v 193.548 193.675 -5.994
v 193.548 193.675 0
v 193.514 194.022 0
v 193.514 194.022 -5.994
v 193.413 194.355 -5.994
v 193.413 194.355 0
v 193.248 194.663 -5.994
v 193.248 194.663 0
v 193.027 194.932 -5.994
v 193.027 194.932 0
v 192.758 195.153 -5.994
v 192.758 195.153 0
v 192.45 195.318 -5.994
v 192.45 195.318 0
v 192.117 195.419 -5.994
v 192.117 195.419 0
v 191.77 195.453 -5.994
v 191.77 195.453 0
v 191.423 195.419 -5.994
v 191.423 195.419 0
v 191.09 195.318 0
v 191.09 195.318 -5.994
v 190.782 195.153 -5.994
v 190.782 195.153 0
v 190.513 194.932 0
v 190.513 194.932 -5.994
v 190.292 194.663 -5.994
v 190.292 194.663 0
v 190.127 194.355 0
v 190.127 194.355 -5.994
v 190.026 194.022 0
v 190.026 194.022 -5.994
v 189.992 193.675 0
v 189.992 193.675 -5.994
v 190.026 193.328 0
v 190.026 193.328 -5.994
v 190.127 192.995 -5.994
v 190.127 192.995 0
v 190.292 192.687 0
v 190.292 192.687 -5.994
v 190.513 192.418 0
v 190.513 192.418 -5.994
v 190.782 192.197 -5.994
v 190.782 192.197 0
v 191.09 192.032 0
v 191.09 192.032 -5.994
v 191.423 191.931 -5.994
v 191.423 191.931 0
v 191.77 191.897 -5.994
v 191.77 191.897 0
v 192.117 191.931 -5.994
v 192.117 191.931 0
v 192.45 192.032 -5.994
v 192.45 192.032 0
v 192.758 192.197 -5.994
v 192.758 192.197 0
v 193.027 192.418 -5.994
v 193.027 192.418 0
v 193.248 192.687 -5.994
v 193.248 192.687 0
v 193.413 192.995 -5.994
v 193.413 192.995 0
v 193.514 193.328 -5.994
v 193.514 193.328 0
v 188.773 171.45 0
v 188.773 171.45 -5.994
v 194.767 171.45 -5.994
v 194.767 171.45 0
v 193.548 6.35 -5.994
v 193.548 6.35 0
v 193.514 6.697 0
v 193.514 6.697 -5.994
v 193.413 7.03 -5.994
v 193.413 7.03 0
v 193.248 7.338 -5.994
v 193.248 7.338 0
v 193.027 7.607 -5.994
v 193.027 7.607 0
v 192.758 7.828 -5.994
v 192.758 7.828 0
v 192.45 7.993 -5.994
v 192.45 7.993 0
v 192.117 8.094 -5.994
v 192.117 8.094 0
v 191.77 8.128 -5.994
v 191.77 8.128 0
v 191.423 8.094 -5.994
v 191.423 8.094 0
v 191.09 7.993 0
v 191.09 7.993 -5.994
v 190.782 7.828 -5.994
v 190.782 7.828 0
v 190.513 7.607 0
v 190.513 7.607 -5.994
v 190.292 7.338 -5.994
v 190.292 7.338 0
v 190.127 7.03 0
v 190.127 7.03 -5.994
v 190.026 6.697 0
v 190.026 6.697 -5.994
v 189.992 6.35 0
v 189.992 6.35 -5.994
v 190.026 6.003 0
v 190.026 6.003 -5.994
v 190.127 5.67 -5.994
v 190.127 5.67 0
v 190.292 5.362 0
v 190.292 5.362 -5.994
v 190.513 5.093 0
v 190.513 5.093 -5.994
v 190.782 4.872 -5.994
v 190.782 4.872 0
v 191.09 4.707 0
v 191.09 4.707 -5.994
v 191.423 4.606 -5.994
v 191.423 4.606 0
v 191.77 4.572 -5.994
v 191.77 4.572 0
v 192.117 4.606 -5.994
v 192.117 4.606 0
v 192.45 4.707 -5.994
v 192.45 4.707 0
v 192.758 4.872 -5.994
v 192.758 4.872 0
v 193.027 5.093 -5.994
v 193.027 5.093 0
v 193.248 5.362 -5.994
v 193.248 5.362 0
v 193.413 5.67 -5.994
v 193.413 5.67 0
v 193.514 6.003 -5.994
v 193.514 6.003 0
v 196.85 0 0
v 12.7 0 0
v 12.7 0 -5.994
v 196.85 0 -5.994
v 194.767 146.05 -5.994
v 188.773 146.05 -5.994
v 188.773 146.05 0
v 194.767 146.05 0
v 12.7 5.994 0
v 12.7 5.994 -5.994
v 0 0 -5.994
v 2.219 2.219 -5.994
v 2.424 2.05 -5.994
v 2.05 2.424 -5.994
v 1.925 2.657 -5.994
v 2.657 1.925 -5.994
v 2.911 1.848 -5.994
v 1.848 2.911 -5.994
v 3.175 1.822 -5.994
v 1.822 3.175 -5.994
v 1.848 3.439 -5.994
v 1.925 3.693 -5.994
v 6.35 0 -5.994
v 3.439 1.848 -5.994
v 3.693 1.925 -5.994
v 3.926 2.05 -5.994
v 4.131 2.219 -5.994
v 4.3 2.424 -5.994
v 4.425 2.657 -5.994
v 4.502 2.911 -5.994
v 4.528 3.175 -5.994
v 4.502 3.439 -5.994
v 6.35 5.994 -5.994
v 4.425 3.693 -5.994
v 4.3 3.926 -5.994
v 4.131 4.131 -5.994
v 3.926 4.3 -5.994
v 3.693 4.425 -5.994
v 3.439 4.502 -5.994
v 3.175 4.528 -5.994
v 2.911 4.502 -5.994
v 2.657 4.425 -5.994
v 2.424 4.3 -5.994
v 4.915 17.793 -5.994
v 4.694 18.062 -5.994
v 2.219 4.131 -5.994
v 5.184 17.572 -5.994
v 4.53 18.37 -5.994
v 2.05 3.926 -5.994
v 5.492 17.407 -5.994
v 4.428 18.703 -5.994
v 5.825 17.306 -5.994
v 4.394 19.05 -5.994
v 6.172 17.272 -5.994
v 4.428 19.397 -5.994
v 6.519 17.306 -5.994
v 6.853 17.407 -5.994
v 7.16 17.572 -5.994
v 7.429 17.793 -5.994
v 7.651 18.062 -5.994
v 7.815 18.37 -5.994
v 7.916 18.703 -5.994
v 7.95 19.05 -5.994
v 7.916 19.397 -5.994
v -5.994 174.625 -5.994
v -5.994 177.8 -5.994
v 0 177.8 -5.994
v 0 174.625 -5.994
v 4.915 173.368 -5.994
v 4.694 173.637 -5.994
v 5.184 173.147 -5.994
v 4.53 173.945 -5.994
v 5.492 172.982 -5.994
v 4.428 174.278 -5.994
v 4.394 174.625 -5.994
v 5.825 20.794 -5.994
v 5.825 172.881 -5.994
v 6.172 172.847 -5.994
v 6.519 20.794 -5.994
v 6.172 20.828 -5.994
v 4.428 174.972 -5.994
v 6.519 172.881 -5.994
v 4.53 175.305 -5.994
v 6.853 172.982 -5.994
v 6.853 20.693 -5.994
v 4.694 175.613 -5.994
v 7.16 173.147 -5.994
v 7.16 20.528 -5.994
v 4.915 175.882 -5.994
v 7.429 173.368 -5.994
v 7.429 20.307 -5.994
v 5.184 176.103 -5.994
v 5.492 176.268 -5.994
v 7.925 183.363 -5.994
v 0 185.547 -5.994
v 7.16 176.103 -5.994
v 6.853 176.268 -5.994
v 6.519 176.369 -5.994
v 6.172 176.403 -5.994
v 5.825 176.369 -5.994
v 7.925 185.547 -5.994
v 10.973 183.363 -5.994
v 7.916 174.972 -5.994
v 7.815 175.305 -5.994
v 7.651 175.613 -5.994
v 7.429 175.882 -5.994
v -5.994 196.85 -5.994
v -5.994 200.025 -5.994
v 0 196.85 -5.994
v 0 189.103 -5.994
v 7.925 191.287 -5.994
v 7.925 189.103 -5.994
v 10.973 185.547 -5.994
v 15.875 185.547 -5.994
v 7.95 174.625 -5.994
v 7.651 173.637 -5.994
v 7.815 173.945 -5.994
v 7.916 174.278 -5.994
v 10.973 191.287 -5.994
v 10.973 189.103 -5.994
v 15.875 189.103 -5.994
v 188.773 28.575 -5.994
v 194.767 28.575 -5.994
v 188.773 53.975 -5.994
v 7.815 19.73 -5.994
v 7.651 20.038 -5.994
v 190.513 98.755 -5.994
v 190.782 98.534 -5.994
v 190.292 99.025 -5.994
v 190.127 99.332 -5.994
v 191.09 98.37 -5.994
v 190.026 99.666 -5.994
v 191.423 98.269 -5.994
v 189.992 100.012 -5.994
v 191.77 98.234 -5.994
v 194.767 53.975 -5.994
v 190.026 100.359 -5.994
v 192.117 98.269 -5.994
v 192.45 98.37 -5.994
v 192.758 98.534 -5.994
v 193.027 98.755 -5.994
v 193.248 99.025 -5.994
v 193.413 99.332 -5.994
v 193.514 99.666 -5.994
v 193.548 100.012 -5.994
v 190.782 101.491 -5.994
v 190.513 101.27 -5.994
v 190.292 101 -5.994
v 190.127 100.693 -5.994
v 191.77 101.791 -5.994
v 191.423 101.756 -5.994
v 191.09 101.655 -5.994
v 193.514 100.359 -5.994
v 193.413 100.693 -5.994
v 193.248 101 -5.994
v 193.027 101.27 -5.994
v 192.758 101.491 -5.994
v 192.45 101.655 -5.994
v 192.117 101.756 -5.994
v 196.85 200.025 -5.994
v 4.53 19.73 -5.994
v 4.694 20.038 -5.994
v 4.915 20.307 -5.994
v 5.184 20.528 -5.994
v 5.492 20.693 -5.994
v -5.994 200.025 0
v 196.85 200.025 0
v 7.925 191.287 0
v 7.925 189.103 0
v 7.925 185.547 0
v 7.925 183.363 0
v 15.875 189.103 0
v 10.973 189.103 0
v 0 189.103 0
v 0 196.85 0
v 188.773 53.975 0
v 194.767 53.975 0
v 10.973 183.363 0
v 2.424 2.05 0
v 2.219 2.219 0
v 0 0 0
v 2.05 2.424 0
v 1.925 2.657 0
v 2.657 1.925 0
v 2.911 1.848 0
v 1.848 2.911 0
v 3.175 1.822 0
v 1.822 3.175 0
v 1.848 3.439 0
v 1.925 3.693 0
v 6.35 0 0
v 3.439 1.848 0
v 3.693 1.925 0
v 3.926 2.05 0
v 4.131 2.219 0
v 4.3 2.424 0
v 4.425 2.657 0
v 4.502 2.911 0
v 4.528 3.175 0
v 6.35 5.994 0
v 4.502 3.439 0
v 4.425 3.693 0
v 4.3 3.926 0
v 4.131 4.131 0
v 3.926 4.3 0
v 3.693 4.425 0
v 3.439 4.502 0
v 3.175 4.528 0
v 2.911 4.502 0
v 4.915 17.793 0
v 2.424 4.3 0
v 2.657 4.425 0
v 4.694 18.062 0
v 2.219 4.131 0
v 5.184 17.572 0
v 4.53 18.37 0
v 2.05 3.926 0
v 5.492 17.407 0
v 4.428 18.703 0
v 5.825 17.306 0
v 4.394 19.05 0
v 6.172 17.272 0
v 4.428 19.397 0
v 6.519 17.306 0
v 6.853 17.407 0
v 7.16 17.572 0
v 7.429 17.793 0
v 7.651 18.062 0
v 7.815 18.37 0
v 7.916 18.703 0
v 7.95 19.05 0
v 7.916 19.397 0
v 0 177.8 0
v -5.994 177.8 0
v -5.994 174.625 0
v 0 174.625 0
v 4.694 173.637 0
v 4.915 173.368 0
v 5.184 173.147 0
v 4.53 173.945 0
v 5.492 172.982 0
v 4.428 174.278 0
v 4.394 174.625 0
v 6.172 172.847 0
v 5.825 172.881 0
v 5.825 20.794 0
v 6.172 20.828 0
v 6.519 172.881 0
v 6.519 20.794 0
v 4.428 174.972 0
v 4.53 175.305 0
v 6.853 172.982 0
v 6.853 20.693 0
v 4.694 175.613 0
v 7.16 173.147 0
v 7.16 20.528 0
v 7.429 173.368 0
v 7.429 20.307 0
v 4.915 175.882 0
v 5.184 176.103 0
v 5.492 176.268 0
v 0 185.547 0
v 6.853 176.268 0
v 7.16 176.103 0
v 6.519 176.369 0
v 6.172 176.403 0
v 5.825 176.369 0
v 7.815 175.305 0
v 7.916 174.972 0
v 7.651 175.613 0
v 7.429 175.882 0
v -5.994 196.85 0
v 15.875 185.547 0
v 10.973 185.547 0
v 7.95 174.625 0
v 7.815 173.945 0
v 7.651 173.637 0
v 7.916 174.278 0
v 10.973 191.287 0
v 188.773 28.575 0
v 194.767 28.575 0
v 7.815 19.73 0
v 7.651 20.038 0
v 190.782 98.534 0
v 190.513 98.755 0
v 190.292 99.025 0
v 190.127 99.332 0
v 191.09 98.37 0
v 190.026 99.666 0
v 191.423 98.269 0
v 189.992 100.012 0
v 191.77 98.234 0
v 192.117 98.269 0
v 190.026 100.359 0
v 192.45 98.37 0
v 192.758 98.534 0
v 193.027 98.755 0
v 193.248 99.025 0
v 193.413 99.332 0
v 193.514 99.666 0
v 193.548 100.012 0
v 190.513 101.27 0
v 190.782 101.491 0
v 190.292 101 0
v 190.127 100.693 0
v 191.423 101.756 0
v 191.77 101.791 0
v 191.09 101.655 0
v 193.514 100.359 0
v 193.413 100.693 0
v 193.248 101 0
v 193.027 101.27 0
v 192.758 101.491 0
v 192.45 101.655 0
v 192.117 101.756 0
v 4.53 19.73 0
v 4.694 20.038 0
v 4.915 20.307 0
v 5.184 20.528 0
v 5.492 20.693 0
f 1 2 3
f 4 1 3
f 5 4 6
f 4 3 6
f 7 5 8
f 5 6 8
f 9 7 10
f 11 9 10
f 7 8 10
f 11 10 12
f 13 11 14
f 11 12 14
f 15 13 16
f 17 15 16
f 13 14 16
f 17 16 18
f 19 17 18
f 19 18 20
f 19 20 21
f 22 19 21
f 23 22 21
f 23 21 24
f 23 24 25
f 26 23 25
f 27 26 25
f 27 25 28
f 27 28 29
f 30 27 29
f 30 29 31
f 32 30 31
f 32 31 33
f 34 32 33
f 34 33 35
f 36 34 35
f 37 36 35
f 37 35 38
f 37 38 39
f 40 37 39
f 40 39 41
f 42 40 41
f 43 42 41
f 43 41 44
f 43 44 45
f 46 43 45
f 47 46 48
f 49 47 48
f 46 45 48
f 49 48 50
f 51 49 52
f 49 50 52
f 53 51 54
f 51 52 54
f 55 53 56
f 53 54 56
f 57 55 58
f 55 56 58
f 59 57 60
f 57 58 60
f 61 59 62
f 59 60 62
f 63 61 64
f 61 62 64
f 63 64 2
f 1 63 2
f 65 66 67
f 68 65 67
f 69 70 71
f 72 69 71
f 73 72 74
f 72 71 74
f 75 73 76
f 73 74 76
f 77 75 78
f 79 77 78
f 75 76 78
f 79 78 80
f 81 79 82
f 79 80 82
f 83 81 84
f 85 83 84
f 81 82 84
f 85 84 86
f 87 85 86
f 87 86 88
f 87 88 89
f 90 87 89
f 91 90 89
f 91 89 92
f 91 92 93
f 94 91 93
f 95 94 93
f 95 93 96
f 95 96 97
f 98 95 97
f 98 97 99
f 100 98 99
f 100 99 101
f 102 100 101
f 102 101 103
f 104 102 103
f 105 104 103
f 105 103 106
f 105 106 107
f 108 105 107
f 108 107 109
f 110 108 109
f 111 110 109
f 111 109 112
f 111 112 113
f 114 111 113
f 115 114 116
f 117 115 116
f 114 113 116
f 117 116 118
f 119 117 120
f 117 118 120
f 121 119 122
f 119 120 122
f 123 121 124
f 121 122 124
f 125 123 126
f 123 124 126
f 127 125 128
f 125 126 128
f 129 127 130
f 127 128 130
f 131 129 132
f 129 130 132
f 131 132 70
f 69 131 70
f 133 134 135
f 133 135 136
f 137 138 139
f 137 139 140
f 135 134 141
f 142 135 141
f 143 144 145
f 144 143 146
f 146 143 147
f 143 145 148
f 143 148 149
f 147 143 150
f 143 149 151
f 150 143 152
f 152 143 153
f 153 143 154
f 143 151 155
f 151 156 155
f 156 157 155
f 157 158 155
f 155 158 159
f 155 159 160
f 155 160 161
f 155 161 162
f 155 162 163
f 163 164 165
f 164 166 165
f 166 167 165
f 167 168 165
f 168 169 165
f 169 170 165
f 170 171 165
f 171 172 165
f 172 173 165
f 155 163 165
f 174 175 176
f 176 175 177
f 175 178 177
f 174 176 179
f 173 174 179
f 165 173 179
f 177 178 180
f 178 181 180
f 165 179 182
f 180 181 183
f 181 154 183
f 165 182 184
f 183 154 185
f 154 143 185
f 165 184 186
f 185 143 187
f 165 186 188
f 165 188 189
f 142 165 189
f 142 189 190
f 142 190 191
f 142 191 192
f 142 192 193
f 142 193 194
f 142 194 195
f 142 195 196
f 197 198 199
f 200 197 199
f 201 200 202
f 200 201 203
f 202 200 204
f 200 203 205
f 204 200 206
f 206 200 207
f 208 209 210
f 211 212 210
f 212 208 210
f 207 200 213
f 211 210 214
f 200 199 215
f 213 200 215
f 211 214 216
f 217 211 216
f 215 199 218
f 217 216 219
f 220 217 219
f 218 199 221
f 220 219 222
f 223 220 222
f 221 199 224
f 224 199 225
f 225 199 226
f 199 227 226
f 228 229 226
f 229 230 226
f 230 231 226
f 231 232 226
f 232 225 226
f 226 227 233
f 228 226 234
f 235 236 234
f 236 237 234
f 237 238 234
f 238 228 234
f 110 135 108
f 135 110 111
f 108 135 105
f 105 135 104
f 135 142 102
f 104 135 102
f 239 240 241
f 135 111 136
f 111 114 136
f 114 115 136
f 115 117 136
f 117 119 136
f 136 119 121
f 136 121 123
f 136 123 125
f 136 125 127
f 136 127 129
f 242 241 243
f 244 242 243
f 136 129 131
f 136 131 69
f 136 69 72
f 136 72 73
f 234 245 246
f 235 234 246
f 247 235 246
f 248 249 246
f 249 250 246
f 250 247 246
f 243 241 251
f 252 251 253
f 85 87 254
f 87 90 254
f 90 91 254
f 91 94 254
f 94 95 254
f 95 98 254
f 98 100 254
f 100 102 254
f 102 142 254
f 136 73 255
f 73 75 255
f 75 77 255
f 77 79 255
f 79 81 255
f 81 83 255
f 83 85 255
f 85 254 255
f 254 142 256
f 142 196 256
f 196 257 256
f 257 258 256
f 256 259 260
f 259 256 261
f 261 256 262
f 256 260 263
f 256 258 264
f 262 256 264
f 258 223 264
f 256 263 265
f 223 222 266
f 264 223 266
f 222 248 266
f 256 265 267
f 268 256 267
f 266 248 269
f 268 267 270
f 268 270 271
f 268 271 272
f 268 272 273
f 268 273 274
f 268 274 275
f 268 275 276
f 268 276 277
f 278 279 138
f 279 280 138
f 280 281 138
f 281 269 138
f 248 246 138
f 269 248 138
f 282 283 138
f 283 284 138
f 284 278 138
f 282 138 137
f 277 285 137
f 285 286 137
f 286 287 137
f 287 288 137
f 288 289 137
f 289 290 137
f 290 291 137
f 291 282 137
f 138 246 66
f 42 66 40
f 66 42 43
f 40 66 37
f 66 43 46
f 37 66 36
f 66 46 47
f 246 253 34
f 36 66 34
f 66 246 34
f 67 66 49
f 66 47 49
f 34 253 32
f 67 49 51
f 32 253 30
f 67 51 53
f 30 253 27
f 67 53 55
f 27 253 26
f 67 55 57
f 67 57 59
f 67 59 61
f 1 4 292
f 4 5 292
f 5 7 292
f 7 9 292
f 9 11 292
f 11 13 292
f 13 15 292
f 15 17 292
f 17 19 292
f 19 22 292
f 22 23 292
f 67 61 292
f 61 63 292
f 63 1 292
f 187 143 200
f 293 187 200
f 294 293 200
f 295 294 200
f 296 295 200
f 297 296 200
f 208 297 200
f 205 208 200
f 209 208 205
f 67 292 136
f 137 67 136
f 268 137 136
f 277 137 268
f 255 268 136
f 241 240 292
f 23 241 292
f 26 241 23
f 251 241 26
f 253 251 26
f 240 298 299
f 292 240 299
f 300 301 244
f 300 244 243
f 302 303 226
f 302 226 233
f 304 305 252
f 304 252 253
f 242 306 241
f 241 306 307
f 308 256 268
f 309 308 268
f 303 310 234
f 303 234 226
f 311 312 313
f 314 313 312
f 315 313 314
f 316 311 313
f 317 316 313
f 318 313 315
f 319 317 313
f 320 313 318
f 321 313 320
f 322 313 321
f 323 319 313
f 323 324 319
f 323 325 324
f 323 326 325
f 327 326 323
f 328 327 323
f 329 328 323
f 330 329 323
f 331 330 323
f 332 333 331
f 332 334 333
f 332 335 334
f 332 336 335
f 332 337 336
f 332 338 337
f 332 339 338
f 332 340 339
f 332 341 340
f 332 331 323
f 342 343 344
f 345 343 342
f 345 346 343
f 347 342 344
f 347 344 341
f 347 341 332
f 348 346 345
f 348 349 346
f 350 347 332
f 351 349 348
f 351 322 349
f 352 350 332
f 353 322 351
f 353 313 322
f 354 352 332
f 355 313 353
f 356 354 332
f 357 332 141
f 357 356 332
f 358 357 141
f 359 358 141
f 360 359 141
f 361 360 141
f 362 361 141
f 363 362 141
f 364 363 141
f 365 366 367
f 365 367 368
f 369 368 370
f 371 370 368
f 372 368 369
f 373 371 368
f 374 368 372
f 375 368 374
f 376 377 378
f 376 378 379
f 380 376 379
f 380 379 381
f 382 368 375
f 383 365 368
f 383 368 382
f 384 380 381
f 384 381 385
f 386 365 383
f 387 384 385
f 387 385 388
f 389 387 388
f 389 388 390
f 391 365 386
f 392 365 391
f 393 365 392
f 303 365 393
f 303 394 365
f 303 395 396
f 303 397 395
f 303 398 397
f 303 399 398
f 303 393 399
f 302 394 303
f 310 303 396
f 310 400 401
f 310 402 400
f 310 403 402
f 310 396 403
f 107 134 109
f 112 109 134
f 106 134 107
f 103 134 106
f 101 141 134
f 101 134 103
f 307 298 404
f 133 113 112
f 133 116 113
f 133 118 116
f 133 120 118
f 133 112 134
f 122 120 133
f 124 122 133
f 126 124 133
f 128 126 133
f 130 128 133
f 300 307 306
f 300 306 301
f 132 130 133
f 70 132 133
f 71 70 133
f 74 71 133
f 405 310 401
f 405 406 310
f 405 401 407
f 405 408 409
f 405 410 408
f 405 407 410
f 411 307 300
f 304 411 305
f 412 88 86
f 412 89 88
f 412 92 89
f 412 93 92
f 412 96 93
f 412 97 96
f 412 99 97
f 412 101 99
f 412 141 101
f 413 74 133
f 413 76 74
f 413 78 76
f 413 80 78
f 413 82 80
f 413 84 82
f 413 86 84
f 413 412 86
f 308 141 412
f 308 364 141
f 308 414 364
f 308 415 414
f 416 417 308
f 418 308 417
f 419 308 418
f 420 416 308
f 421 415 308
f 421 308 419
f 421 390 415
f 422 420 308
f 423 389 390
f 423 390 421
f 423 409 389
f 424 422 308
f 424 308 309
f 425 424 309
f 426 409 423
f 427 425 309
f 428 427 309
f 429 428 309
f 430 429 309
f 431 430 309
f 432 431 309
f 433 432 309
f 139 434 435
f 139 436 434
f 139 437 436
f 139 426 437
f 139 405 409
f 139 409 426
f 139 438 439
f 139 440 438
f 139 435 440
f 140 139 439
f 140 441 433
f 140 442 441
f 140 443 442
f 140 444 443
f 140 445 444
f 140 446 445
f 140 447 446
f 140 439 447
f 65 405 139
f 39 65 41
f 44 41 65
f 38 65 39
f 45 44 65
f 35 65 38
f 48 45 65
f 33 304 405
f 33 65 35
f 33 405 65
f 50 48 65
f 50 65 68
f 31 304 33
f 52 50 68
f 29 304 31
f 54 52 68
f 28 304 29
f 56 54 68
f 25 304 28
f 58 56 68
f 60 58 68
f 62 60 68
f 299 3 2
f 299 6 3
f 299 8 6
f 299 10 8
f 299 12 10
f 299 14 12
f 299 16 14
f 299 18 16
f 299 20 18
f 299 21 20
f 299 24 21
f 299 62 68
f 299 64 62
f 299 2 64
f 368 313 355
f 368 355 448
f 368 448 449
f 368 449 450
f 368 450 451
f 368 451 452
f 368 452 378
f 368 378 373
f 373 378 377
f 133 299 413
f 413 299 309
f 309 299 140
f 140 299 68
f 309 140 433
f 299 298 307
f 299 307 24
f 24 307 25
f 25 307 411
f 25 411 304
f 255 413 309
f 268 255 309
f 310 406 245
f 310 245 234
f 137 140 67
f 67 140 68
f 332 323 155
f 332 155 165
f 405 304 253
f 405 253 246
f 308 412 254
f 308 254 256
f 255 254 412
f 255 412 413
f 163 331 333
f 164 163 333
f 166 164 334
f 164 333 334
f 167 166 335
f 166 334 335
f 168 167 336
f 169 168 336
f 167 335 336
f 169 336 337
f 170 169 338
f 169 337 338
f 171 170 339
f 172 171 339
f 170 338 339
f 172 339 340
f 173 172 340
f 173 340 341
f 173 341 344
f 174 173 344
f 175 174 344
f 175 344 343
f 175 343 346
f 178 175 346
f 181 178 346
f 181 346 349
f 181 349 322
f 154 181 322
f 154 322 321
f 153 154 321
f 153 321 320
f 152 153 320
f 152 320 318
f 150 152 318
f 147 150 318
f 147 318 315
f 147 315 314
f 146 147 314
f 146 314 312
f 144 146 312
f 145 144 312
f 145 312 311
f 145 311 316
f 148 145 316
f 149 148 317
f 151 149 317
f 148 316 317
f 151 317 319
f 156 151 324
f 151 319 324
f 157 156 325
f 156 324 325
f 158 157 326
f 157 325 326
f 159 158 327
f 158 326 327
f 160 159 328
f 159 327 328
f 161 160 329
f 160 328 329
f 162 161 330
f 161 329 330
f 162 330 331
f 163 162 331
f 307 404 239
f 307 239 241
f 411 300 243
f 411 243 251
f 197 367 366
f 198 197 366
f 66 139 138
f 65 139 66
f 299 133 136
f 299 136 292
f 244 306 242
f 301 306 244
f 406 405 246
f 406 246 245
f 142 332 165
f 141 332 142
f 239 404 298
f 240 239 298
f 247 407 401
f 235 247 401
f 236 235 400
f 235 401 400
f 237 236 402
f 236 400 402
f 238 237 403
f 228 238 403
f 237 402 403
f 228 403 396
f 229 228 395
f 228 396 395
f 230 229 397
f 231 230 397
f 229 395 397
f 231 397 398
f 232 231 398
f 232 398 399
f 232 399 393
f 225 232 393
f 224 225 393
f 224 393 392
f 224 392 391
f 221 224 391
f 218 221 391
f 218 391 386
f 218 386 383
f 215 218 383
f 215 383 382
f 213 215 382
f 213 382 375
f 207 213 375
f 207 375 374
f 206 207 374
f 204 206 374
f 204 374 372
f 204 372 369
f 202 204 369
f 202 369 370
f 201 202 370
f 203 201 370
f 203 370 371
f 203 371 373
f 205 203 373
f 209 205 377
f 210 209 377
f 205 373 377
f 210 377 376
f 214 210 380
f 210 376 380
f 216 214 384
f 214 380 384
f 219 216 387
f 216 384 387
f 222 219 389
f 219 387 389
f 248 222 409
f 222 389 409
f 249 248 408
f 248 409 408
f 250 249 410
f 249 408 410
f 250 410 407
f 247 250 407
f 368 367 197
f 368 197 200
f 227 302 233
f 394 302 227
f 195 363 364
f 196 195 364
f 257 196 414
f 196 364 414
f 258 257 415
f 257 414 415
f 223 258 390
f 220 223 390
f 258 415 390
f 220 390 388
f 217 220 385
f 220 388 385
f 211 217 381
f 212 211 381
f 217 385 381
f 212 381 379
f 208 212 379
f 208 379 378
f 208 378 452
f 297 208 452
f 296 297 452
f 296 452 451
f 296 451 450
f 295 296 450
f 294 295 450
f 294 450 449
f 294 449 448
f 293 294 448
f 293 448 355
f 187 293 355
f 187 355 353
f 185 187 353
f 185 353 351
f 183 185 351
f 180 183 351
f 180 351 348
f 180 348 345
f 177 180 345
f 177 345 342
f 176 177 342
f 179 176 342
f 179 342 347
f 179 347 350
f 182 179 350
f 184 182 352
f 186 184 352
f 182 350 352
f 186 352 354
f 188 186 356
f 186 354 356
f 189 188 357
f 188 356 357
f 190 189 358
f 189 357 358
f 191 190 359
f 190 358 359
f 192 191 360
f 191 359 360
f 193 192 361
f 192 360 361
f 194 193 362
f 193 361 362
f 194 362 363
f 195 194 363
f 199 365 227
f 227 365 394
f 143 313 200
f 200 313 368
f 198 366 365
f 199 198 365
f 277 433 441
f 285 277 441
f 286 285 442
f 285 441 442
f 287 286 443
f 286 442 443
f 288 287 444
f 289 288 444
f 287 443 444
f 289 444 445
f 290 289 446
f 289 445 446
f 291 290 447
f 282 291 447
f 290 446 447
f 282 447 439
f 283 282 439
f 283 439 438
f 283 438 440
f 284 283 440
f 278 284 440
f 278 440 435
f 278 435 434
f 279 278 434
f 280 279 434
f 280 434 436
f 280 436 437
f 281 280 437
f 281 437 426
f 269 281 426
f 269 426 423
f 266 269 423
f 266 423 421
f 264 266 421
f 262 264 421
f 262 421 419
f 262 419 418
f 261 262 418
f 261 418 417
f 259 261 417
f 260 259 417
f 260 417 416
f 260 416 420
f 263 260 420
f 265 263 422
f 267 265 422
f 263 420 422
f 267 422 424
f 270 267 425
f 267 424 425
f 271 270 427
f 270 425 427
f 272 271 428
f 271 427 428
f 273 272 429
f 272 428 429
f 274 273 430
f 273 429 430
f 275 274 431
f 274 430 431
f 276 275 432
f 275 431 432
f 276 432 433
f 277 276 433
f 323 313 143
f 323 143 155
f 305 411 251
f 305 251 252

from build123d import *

# Parameters (mm, degrees)
SKETCH1_W           = 196.85
SKETCH1_H           = 200.025
BOSS_EXTRUDE1_DEPTH = 5.9944
SKETCH2_R           = 1.778
SKETCH2_R_2         = 1.35255
SKETCH2_W           = 5.9944
SKETCH2_H           = 25.4
SKETCH2_W_2         = 6.35
SKETCH2_H_2         = 5.9944
CUT_EXTRUDE1_DEPTH  = 6.9944
SKETCH3_W           = 5.9944
SKETCH3_H           = 3.175
BOSS_EXTRUDE2_DEPTH = 5.9944


with BuildPart() as part:
    # Sketch1 → Boss-Extrude1 (new body)
    with BuildSketch(Plane.XY):
        with Locations((98.425, 100.0125)):
            Rectangle(SKETCH1_W, SKETCH1_H)
    extrude(amount=-BOSS_EXTRUDE1_DEPTH)

    # Sketch2 → Cut-Extrude1 (cut, through all)
    with BuildSketch(Plane.XY):
        with Locations((191.77, 193.675)):
            Circle(SKETCH2_R)
        with Locations((191.77, 100.0125)):
            Circle(SKETCH2_R)
        with Locations((191.77, 6.35)):
            Circle(SKETCH2_R)
        with Locations((3.175, 3.175)):
            Circle(SKETCH2_R_2)
        with Locations((6.1722, 174.625)):
            Circle(SKETCH2_R)
        with Locations((6.1722, 19.05)):
            Circle(SKETCH2_R)
        with Locations((191.77, 158.75)):
            Rectangle(SKETCH2_W, SKETCH2_H)
        with Locations((191.77, 41.275)):
            Rectangle(SKETCH2_W, SKETCH2_H)
        Polygon((7.9248, 189.103), (7.9248, 191.2874), (10.9728, 191.2874), (10.9728, 189.103), (15.875, 189.103), (15.875, 185.547), (10.9728, 185.547), (10.9728, 183.3626), (7.9248, 183.3626), (7.9248, 185.547), (0, 185.547), (0, 189.103), align=None)
        with Locations((9.525, 2.9972)):
            Rectangle(SKETCH2_W_2, SKETCH2_H_2)
    extrude(amount=-CUT_EXTRUDE1_DEPTH, mode=Mode.SUBTRACT)

    # Sketch3 → Boss-Extrude2 (add)
    with BuildSketch(Plane.XY):
        with Locations((-2.9972, 198.4375)):
            Rectangle(SKETCH3_W, SKETCH3_H)
        with Locations((-2.9972, 176.2125)):
            Rectangle(SKETCH3_W, SKETCH3_H)
    extrude(amount=-BOSS_EXTRUDE2_DEPTH)


solid = part.part
